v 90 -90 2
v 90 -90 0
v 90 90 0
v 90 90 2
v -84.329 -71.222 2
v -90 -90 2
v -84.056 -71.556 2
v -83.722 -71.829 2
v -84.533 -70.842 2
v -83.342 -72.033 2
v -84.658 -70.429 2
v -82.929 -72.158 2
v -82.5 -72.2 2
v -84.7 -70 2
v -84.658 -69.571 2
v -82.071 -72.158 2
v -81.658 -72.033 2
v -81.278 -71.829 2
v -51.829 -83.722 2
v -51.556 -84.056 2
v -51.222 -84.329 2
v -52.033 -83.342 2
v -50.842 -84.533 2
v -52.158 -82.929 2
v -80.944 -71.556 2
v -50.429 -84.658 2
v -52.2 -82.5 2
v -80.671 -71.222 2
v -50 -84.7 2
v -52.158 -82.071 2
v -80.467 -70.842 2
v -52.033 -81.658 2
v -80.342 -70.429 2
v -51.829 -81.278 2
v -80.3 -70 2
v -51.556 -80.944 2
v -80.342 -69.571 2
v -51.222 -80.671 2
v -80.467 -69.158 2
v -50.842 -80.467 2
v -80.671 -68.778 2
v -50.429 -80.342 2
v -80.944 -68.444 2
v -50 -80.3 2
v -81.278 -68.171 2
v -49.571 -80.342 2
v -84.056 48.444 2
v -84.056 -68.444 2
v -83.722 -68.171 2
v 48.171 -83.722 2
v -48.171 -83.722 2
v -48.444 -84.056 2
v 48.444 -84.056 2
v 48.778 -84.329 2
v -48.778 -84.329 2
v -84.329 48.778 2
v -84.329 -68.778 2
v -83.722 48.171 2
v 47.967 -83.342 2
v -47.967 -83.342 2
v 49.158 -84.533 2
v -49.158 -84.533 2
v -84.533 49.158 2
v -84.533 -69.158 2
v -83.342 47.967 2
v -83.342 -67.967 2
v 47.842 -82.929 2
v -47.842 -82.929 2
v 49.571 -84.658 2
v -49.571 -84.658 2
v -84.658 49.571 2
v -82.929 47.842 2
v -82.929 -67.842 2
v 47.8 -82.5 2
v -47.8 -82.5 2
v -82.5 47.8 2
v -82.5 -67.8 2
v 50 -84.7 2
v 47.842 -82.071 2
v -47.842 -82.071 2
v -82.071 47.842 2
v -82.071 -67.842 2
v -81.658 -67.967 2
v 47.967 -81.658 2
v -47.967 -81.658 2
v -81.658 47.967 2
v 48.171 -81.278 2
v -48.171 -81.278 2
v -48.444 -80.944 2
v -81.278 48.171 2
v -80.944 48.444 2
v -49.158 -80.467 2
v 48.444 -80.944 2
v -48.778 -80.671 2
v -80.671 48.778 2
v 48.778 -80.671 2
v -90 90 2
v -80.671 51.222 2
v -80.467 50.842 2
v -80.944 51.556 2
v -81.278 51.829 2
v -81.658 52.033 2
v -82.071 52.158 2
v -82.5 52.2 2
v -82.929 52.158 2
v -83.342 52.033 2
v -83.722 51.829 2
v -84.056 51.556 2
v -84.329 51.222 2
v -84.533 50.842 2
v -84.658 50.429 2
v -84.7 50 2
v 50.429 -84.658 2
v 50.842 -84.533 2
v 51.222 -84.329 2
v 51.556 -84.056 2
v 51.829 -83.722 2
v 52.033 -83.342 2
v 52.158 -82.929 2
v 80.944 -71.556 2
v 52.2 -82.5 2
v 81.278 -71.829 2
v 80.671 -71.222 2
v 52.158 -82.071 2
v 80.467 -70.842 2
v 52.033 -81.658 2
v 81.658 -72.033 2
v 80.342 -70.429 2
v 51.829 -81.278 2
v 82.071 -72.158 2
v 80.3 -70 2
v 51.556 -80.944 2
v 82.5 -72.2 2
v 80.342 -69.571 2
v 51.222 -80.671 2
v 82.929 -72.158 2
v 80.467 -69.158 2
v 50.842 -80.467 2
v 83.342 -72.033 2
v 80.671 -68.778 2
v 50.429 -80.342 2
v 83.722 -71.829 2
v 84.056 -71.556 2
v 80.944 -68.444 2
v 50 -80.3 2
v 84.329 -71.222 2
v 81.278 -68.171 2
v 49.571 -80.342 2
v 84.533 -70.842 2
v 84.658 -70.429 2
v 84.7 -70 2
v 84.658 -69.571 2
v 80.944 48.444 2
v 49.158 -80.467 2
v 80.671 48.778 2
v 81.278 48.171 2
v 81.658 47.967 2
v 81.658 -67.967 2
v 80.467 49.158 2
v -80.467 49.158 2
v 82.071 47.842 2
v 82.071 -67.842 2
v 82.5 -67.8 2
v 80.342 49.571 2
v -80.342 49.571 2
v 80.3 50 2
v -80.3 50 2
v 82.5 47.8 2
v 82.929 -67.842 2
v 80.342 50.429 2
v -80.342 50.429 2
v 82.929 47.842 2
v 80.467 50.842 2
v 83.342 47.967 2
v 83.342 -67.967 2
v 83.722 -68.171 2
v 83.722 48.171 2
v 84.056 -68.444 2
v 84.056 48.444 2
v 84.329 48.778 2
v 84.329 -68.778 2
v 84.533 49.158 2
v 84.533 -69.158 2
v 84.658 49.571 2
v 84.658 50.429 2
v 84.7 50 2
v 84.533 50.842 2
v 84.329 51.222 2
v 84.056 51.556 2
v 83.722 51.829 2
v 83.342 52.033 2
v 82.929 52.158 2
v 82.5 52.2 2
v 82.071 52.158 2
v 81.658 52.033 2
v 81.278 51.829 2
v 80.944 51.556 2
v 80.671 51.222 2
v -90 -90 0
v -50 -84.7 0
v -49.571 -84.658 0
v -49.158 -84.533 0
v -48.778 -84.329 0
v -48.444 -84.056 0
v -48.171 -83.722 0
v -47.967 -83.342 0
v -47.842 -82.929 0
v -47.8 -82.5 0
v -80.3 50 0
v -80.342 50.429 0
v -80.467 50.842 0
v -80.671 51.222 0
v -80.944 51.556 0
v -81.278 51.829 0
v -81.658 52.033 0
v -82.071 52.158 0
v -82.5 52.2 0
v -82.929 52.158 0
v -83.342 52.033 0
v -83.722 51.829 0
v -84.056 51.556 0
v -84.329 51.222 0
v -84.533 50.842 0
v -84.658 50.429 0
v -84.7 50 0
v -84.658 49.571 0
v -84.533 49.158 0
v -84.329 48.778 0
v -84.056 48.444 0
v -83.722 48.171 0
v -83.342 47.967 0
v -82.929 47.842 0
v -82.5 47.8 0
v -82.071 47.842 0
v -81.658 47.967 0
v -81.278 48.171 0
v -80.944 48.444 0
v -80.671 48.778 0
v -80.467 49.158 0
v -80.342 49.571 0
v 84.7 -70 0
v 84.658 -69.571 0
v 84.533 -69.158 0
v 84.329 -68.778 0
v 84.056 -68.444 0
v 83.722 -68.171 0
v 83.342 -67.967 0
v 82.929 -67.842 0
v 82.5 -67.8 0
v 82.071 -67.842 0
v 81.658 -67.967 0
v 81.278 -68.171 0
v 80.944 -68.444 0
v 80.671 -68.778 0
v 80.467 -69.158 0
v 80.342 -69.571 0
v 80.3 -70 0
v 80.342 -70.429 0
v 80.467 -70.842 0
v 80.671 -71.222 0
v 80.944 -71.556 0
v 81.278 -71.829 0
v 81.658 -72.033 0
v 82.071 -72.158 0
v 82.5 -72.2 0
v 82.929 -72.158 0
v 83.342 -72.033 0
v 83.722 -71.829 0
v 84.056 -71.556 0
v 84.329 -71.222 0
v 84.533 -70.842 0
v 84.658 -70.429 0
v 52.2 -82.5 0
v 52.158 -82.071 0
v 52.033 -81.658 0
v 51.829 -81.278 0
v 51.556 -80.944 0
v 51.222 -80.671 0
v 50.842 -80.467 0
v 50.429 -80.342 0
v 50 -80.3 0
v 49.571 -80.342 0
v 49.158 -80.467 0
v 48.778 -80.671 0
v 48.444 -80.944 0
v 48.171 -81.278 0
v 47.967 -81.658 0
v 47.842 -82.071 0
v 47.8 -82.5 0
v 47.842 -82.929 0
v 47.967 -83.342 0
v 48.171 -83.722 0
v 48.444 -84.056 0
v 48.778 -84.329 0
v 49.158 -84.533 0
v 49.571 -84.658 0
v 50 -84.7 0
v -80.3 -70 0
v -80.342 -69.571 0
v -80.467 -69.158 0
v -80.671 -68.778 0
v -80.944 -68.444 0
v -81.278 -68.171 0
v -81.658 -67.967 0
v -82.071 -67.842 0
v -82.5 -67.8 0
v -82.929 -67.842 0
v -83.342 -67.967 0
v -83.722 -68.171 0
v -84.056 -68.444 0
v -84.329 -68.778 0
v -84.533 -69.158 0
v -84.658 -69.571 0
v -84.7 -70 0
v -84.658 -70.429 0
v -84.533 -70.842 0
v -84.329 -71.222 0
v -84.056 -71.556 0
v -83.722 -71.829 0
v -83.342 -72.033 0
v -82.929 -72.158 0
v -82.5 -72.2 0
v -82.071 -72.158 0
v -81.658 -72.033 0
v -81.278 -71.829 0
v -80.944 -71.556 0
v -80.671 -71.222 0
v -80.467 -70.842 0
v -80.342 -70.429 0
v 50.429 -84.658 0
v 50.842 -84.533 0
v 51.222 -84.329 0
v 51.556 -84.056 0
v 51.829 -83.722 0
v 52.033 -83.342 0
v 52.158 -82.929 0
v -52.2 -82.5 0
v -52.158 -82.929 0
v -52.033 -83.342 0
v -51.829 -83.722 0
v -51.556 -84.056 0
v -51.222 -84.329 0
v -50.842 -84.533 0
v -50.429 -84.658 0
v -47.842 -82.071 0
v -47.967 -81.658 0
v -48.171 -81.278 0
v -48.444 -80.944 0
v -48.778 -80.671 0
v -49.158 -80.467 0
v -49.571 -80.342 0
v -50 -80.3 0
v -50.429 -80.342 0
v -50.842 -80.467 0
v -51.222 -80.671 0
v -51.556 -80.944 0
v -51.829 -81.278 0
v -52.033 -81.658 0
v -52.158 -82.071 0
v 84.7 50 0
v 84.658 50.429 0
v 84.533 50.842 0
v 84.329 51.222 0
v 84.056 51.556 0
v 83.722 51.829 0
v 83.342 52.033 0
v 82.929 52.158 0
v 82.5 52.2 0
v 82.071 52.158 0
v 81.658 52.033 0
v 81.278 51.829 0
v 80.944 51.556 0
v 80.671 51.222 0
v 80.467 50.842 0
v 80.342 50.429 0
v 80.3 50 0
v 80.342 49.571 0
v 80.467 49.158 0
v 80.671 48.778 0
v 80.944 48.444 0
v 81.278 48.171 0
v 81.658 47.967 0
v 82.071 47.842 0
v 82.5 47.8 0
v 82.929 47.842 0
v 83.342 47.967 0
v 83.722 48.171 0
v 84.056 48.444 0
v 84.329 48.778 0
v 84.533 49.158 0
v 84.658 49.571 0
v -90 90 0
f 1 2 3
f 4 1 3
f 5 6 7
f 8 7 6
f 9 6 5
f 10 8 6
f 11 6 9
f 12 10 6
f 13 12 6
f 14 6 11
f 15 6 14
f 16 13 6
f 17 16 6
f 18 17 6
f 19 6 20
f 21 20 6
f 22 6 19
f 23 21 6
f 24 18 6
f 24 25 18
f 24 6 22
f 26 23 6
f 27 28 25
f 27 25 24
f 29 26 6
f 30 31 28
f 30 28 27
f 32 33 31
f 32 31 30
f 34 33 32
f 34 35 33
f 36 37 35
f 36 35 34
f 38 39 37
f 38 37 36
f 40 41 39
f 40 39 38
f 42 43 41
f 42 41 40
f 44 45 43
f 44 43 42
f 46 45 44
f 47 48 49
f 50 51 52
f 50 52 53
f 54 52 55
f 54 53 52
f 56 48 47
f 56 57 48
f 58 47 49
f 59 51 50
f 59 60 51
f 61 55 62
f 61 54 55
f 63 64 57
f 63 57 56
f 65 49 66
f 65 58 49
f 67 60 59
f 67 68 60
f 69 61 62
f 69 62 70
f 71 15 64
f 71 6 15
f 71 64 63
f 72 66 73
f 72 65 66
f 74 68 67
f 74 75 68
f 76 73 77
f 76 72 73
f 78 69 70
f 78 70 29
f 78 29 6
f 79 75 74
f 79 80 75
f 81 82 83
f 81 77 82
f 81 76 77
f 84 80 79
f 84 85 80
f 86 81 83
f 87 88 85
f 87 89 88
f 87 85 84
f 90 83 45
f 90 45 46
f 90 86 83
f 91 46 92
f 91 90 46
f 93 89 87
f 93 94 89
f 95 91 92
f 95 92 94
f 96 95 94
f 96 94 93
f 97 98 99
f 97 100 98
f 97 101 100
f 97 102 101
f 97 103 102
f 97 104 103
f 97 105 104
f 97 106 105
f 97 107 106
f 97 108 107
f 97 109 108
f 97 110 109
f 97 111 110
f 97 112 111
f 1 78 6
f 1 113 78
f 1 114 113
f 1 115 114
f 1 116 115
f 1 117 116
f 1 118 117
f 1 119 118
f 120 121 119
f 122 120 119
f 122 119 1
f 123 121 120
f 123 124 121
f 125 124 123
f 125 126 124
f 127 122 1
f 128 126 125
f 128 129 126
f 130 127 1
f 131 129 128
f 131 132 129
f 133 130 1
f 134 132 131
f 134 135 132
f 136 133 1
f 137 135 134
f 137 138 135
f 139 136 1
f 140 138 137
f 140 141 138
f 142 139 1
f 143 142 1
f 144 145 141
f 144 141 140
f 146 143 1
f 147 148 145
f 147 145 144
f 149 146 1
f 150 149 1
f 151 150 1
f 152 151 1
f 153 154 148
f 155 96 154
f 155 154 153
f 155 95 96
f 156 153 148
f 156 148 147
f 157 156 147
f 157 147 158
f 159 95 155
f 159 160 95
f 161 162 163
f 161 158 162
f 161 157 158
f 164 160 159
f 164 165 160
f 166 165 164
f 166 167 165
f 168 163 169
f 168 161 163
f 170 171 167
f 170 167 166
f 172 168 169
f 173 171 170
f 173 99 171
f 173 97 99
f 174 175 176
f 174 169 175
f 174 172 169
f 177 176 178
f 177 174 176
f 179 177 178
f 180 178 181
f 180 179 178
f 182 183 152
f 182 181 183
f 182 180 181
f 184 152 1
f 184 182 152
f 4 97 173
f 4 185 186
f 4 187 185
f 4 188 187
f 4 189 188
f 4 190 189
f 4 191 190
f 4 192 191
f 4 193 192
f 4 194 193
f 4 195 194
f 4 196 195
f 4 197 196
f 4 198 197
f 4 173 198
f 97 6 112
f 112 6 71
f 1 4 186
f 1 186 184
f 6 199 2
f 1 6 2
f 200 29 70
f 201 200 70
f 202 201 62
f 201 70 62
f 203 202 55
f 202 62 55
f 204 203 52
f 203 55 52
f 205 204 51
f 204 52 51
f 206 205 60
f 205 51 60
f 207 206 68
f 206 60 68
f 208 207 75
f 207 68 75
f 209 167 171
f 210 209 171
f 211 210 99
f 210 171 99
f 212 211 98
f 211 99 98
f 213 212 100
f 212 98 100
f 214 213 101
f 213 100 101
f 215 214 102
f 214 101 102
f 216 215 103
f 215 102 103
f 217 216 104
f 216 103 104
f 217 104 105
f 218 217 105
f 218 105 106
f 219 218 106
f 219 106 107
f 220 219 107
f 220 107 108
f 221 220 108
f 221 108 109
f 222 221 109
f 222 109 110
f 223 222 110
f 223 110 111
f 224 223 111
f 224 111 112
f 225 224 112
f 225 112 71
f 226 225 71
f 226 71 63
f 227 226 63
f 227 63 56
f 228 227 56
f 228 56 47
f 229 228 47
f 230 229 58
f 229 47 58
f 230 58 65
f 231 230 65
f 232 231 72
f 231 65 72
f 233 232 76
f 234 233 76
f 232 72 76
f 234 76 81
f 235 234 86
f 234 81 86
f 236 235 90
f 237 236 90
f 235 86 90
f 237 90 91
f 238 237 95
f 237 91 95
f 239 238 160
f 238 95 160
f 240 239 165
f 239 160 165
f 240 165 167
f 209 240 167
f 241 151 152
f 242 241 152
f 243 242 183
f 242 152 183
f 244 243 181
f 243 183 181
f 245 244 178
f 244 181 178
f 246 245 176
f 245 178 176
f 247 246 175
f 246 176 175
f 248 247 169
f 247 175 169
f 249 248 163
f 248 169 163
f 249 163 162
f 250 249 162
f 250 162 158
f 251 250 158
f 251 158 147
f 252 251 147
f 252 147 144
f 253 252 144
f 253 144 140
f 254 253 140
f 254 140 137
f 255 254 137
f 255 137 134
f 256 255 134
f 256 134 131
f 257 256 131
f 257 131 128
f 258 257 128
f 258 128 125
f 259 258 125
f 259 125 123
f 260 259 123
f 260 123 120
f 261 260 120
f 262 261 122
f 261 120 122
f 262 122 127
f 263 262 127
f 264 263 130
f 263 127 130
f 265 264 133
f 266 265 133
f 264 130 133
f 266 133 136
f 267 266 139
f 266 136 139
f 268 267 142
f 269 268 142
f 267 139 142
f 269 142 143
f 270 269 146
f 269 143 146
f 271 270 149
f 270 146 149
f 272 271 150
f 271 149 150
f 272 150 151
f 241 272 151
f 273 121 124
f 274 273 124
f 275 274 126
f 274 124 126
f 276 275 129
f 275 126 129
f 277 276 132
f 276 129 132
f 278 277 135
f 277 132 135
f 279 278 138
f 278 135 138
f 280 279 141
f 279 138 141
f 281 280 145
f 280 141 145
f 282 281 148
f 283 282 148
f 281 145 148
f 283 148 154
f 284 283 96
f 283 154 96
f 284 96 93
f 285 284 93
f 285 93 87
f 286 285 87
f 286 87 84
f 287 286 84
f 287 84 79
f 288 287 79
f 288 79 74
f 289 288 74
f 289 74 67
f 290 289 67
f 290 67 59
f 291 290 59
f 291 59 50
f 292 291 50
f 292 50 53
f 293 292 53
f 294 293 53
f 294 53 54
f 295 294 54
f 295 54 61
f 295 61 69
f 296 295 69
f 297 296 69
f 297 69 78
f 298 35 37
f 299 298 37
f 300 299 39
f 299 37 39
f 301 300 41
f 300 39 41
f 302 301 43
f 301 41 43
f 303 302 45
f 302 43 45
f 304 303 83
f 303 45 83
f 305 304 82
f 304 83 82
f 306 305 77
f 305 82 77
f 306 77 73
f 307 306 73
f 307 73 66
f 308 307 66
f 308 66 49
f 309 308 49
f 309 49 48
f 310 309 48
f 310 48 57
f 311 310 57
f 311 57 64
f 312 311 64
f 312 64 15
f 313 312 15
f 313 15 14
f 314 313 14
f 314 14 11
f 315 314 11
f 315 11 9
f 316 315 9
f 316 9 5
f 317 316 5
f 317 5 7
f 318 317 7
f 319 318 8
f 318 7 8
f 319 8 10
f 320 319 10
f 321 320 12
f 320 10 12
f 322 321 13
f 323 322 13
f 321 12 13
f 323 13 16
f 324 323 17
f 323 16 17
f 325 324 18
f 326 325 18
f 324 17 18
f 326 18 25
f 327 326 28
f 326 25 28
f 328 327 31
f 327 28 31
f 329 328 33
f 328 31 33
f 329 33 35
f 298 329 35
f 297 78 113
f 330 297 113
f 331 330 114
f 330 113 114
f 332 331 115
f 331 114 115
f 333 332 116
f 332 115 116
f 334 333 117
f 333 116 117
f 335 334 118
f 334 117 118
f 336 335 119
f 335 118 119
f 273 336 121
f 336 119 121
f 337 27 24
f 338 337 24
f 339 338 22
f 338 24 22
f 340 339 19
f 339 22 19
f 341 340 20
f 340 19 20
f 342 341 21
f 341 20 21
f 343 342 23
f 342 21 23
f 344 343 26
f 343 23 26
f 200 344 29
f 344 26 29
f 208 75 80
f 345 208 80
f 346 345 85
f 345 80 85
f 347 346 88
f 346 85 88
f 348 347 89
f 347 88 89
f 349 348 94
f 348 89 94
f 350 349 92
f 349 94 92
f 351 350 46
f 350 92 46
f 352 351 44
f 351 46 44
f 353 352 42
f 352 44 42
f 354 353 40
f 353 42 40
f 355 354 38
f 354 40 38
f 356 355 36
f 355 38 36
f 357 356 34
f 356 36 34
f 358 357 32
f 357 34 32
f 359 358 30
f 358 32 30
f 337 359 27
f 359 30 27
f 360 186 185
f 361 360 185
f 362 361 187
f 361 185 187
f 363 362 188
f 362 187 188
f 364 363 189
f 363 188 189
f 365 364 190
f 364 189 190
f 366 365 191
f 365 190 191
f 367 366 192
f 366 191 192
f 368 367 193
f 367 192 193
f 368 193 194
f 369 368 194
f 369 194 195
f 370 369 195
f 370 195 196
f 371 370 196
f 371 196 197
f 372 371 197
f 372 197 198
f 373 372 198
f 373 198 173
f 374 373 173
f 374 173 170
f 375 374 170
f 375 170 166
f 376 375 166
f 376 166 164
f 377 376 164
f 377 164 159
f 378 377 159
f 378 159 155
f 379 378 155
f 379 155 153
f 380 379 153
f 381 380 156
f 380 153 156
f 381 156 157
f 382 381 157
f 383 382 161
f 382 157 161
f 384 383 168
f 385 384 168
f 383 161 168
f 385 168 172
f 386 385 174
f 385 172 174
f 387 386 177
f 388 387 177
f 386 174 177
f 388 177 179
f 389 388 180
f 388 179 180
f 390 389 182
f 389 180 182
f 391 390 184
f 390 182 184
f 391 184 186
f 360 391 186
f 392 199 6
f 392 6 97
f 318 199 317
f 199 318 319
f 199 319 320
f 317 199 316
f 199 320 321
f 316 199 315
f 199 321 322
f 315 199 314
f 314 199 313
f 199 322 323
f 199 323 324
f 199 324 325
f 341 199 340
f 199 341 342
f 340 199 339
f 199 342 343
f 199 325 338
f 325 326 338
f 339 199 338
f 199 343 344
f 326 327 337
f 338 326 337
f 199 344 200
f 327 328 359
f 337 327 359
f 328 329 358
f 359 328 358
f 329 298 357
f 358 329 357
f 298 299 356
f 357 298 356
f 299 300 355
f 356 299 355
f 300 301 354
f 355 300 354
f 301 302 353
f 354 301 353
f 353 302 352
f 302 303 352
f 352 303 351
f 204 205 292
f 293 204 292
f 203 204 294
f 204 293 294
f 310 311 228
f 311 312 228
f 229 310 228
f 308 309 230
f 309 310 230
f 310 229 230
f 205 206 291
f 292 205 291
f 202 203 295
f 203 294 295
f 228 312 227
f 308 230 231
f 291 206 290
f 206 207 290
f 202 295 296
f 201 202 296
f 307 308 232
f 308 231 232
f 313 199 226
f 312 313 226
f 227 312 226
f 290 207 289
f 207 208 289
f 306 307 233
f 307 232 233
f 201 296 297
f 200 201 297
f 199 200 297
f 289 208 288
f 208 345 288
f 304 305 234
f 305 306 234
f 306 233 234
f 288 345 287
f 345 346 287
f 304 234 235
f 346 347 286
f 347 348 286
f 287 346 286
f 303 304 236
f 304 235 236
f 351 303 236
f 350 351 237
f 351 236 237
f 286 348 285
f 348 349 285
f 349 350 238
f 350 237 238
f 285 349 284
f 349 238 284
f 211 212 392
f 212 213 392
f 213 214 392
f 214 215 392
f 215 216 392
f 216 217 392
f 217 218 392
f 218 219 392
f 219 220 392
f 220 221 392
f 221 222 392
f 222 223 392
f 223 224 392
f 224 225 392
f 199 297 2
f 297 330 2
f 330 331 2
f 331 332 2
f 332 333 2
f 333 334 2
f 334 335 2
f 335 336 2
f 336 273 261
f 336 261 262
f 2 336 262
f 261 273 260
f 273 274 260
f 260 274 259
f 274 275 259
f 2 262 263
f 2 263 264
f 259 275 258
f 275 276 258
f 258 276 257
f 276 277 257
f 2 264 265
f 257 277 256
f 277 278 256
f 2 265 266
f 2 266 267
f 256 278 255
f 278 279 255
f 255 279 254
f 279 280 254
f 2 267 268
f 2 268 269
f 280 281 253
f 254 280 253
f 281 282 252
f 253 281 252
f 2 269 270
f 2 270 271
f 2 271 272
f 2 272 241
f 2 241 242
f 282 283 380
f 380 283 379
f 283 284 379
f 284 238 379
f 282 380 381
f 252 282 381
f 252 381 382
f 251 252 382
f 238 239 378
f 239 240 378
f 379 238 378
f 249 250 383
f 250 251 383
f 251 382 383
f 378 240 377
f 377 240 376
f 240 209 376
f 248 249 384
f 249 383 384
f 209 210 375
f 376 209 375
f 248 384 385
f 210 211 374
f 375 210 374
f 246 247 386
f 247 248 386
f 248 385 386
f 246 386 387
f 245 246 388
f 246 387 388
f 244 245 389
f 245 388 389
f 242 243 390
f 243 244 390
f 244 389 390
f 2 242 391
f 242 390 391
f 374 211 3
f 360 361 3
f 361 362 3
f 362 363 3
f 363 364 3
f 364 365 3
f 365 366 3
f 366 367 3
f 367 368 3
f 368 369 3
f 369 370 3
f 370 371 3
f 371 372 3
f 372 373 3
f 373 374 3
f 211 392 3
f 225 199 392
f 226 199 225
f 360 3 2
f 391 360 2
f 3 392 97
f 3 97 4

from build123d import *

# Parameters (mm, degrees)
SKETCH_1_W          = 180
SKETCH_1_H          = 180
EXTRUDE_1_DEPTH     = 2
CUT_EXTRUDE_1_DEPTH = 140
SKETCH_3_R          = 2.2
CUT_EXTRUDE_2_DEPTH = 160


with BuildPart() as part:
    # ｽｹｯﾁ1 → ﾎﾞｽ - 押し出し1 (new body)
    with BuildSketch(Plane.XY):
        Rectangle(SKETCH_1_W, SKETCH_1_H)
    extrude(amount=EXTRUDE_1_DEPTH)

    # ｽｹｯﾁ2 → ｶｯﾄ - 押し出し1 (cut)
    with BuildSketch(Plane.XY.offset(2)):
        with BuildLine():
            ThreePointArc((-52.2, -82.5), (-51.555634919, -84.055634919), (-50, -84.7))
            Line((-50, -84.7), (-50, -82.5))
            Line((-50, -82.5), (-52.2, -82.5))
        make_face()
        with BuildLine():
            Line((-50, -82.5), (-50, -84.7))
            ThreePointArc((-50, -84.7), (-48.444365081, -84.055634919), (-47.8, -82.5))
            ThreePointArc((-47.8, -82.5), (-50, -80.3), (-52.2, -82.5))
            Line((-52.2, -82.5), (-50, -82.5))
        make_face()
        with BuildLine():
            ThreePointArc((52.2, -82.5), (48.444365081, -80.944365081), (50, -84.7))
            Line((50, -84.7), (50, -82.5))
            Line((50, -82.5), (52.2, -82.5))
        make_face()
        with BuildLine():
            Line((50, -82.5), (50, -84.7))
            ThreePointArc((50, -84.7), (51.555634919, -84.055634919), (52.2, -82.5))
            Line((52.2, -82.5), (50, -82.5))
        make_face()
    extrude(amount=-CUT_EXTRUDE_1_DEPTH, mode=Mode.SUBTRACT)

    # ｽｹｯﾁ3 → ｶｯﾄ - 押し出し2 (cut)
    with BuildSketch(Plane.XY.offset(2)):
        with Locations((-82.5, 50)):
            Circle(SKETCH_3_R)
        with Locations((82.5, 50)):
            Circle(SKETCH_3_R)
        with Locations((82.5, -70)):
            Circle(SKETCH_3_R)
        with Locations((-82.5, -70)):
            Circle(SKETCH_3_R)
    extrude(amount=-CUT_EXTRUDE_2_DEPTH, mode=Mode.SUBTRACT)


solid = part.part
